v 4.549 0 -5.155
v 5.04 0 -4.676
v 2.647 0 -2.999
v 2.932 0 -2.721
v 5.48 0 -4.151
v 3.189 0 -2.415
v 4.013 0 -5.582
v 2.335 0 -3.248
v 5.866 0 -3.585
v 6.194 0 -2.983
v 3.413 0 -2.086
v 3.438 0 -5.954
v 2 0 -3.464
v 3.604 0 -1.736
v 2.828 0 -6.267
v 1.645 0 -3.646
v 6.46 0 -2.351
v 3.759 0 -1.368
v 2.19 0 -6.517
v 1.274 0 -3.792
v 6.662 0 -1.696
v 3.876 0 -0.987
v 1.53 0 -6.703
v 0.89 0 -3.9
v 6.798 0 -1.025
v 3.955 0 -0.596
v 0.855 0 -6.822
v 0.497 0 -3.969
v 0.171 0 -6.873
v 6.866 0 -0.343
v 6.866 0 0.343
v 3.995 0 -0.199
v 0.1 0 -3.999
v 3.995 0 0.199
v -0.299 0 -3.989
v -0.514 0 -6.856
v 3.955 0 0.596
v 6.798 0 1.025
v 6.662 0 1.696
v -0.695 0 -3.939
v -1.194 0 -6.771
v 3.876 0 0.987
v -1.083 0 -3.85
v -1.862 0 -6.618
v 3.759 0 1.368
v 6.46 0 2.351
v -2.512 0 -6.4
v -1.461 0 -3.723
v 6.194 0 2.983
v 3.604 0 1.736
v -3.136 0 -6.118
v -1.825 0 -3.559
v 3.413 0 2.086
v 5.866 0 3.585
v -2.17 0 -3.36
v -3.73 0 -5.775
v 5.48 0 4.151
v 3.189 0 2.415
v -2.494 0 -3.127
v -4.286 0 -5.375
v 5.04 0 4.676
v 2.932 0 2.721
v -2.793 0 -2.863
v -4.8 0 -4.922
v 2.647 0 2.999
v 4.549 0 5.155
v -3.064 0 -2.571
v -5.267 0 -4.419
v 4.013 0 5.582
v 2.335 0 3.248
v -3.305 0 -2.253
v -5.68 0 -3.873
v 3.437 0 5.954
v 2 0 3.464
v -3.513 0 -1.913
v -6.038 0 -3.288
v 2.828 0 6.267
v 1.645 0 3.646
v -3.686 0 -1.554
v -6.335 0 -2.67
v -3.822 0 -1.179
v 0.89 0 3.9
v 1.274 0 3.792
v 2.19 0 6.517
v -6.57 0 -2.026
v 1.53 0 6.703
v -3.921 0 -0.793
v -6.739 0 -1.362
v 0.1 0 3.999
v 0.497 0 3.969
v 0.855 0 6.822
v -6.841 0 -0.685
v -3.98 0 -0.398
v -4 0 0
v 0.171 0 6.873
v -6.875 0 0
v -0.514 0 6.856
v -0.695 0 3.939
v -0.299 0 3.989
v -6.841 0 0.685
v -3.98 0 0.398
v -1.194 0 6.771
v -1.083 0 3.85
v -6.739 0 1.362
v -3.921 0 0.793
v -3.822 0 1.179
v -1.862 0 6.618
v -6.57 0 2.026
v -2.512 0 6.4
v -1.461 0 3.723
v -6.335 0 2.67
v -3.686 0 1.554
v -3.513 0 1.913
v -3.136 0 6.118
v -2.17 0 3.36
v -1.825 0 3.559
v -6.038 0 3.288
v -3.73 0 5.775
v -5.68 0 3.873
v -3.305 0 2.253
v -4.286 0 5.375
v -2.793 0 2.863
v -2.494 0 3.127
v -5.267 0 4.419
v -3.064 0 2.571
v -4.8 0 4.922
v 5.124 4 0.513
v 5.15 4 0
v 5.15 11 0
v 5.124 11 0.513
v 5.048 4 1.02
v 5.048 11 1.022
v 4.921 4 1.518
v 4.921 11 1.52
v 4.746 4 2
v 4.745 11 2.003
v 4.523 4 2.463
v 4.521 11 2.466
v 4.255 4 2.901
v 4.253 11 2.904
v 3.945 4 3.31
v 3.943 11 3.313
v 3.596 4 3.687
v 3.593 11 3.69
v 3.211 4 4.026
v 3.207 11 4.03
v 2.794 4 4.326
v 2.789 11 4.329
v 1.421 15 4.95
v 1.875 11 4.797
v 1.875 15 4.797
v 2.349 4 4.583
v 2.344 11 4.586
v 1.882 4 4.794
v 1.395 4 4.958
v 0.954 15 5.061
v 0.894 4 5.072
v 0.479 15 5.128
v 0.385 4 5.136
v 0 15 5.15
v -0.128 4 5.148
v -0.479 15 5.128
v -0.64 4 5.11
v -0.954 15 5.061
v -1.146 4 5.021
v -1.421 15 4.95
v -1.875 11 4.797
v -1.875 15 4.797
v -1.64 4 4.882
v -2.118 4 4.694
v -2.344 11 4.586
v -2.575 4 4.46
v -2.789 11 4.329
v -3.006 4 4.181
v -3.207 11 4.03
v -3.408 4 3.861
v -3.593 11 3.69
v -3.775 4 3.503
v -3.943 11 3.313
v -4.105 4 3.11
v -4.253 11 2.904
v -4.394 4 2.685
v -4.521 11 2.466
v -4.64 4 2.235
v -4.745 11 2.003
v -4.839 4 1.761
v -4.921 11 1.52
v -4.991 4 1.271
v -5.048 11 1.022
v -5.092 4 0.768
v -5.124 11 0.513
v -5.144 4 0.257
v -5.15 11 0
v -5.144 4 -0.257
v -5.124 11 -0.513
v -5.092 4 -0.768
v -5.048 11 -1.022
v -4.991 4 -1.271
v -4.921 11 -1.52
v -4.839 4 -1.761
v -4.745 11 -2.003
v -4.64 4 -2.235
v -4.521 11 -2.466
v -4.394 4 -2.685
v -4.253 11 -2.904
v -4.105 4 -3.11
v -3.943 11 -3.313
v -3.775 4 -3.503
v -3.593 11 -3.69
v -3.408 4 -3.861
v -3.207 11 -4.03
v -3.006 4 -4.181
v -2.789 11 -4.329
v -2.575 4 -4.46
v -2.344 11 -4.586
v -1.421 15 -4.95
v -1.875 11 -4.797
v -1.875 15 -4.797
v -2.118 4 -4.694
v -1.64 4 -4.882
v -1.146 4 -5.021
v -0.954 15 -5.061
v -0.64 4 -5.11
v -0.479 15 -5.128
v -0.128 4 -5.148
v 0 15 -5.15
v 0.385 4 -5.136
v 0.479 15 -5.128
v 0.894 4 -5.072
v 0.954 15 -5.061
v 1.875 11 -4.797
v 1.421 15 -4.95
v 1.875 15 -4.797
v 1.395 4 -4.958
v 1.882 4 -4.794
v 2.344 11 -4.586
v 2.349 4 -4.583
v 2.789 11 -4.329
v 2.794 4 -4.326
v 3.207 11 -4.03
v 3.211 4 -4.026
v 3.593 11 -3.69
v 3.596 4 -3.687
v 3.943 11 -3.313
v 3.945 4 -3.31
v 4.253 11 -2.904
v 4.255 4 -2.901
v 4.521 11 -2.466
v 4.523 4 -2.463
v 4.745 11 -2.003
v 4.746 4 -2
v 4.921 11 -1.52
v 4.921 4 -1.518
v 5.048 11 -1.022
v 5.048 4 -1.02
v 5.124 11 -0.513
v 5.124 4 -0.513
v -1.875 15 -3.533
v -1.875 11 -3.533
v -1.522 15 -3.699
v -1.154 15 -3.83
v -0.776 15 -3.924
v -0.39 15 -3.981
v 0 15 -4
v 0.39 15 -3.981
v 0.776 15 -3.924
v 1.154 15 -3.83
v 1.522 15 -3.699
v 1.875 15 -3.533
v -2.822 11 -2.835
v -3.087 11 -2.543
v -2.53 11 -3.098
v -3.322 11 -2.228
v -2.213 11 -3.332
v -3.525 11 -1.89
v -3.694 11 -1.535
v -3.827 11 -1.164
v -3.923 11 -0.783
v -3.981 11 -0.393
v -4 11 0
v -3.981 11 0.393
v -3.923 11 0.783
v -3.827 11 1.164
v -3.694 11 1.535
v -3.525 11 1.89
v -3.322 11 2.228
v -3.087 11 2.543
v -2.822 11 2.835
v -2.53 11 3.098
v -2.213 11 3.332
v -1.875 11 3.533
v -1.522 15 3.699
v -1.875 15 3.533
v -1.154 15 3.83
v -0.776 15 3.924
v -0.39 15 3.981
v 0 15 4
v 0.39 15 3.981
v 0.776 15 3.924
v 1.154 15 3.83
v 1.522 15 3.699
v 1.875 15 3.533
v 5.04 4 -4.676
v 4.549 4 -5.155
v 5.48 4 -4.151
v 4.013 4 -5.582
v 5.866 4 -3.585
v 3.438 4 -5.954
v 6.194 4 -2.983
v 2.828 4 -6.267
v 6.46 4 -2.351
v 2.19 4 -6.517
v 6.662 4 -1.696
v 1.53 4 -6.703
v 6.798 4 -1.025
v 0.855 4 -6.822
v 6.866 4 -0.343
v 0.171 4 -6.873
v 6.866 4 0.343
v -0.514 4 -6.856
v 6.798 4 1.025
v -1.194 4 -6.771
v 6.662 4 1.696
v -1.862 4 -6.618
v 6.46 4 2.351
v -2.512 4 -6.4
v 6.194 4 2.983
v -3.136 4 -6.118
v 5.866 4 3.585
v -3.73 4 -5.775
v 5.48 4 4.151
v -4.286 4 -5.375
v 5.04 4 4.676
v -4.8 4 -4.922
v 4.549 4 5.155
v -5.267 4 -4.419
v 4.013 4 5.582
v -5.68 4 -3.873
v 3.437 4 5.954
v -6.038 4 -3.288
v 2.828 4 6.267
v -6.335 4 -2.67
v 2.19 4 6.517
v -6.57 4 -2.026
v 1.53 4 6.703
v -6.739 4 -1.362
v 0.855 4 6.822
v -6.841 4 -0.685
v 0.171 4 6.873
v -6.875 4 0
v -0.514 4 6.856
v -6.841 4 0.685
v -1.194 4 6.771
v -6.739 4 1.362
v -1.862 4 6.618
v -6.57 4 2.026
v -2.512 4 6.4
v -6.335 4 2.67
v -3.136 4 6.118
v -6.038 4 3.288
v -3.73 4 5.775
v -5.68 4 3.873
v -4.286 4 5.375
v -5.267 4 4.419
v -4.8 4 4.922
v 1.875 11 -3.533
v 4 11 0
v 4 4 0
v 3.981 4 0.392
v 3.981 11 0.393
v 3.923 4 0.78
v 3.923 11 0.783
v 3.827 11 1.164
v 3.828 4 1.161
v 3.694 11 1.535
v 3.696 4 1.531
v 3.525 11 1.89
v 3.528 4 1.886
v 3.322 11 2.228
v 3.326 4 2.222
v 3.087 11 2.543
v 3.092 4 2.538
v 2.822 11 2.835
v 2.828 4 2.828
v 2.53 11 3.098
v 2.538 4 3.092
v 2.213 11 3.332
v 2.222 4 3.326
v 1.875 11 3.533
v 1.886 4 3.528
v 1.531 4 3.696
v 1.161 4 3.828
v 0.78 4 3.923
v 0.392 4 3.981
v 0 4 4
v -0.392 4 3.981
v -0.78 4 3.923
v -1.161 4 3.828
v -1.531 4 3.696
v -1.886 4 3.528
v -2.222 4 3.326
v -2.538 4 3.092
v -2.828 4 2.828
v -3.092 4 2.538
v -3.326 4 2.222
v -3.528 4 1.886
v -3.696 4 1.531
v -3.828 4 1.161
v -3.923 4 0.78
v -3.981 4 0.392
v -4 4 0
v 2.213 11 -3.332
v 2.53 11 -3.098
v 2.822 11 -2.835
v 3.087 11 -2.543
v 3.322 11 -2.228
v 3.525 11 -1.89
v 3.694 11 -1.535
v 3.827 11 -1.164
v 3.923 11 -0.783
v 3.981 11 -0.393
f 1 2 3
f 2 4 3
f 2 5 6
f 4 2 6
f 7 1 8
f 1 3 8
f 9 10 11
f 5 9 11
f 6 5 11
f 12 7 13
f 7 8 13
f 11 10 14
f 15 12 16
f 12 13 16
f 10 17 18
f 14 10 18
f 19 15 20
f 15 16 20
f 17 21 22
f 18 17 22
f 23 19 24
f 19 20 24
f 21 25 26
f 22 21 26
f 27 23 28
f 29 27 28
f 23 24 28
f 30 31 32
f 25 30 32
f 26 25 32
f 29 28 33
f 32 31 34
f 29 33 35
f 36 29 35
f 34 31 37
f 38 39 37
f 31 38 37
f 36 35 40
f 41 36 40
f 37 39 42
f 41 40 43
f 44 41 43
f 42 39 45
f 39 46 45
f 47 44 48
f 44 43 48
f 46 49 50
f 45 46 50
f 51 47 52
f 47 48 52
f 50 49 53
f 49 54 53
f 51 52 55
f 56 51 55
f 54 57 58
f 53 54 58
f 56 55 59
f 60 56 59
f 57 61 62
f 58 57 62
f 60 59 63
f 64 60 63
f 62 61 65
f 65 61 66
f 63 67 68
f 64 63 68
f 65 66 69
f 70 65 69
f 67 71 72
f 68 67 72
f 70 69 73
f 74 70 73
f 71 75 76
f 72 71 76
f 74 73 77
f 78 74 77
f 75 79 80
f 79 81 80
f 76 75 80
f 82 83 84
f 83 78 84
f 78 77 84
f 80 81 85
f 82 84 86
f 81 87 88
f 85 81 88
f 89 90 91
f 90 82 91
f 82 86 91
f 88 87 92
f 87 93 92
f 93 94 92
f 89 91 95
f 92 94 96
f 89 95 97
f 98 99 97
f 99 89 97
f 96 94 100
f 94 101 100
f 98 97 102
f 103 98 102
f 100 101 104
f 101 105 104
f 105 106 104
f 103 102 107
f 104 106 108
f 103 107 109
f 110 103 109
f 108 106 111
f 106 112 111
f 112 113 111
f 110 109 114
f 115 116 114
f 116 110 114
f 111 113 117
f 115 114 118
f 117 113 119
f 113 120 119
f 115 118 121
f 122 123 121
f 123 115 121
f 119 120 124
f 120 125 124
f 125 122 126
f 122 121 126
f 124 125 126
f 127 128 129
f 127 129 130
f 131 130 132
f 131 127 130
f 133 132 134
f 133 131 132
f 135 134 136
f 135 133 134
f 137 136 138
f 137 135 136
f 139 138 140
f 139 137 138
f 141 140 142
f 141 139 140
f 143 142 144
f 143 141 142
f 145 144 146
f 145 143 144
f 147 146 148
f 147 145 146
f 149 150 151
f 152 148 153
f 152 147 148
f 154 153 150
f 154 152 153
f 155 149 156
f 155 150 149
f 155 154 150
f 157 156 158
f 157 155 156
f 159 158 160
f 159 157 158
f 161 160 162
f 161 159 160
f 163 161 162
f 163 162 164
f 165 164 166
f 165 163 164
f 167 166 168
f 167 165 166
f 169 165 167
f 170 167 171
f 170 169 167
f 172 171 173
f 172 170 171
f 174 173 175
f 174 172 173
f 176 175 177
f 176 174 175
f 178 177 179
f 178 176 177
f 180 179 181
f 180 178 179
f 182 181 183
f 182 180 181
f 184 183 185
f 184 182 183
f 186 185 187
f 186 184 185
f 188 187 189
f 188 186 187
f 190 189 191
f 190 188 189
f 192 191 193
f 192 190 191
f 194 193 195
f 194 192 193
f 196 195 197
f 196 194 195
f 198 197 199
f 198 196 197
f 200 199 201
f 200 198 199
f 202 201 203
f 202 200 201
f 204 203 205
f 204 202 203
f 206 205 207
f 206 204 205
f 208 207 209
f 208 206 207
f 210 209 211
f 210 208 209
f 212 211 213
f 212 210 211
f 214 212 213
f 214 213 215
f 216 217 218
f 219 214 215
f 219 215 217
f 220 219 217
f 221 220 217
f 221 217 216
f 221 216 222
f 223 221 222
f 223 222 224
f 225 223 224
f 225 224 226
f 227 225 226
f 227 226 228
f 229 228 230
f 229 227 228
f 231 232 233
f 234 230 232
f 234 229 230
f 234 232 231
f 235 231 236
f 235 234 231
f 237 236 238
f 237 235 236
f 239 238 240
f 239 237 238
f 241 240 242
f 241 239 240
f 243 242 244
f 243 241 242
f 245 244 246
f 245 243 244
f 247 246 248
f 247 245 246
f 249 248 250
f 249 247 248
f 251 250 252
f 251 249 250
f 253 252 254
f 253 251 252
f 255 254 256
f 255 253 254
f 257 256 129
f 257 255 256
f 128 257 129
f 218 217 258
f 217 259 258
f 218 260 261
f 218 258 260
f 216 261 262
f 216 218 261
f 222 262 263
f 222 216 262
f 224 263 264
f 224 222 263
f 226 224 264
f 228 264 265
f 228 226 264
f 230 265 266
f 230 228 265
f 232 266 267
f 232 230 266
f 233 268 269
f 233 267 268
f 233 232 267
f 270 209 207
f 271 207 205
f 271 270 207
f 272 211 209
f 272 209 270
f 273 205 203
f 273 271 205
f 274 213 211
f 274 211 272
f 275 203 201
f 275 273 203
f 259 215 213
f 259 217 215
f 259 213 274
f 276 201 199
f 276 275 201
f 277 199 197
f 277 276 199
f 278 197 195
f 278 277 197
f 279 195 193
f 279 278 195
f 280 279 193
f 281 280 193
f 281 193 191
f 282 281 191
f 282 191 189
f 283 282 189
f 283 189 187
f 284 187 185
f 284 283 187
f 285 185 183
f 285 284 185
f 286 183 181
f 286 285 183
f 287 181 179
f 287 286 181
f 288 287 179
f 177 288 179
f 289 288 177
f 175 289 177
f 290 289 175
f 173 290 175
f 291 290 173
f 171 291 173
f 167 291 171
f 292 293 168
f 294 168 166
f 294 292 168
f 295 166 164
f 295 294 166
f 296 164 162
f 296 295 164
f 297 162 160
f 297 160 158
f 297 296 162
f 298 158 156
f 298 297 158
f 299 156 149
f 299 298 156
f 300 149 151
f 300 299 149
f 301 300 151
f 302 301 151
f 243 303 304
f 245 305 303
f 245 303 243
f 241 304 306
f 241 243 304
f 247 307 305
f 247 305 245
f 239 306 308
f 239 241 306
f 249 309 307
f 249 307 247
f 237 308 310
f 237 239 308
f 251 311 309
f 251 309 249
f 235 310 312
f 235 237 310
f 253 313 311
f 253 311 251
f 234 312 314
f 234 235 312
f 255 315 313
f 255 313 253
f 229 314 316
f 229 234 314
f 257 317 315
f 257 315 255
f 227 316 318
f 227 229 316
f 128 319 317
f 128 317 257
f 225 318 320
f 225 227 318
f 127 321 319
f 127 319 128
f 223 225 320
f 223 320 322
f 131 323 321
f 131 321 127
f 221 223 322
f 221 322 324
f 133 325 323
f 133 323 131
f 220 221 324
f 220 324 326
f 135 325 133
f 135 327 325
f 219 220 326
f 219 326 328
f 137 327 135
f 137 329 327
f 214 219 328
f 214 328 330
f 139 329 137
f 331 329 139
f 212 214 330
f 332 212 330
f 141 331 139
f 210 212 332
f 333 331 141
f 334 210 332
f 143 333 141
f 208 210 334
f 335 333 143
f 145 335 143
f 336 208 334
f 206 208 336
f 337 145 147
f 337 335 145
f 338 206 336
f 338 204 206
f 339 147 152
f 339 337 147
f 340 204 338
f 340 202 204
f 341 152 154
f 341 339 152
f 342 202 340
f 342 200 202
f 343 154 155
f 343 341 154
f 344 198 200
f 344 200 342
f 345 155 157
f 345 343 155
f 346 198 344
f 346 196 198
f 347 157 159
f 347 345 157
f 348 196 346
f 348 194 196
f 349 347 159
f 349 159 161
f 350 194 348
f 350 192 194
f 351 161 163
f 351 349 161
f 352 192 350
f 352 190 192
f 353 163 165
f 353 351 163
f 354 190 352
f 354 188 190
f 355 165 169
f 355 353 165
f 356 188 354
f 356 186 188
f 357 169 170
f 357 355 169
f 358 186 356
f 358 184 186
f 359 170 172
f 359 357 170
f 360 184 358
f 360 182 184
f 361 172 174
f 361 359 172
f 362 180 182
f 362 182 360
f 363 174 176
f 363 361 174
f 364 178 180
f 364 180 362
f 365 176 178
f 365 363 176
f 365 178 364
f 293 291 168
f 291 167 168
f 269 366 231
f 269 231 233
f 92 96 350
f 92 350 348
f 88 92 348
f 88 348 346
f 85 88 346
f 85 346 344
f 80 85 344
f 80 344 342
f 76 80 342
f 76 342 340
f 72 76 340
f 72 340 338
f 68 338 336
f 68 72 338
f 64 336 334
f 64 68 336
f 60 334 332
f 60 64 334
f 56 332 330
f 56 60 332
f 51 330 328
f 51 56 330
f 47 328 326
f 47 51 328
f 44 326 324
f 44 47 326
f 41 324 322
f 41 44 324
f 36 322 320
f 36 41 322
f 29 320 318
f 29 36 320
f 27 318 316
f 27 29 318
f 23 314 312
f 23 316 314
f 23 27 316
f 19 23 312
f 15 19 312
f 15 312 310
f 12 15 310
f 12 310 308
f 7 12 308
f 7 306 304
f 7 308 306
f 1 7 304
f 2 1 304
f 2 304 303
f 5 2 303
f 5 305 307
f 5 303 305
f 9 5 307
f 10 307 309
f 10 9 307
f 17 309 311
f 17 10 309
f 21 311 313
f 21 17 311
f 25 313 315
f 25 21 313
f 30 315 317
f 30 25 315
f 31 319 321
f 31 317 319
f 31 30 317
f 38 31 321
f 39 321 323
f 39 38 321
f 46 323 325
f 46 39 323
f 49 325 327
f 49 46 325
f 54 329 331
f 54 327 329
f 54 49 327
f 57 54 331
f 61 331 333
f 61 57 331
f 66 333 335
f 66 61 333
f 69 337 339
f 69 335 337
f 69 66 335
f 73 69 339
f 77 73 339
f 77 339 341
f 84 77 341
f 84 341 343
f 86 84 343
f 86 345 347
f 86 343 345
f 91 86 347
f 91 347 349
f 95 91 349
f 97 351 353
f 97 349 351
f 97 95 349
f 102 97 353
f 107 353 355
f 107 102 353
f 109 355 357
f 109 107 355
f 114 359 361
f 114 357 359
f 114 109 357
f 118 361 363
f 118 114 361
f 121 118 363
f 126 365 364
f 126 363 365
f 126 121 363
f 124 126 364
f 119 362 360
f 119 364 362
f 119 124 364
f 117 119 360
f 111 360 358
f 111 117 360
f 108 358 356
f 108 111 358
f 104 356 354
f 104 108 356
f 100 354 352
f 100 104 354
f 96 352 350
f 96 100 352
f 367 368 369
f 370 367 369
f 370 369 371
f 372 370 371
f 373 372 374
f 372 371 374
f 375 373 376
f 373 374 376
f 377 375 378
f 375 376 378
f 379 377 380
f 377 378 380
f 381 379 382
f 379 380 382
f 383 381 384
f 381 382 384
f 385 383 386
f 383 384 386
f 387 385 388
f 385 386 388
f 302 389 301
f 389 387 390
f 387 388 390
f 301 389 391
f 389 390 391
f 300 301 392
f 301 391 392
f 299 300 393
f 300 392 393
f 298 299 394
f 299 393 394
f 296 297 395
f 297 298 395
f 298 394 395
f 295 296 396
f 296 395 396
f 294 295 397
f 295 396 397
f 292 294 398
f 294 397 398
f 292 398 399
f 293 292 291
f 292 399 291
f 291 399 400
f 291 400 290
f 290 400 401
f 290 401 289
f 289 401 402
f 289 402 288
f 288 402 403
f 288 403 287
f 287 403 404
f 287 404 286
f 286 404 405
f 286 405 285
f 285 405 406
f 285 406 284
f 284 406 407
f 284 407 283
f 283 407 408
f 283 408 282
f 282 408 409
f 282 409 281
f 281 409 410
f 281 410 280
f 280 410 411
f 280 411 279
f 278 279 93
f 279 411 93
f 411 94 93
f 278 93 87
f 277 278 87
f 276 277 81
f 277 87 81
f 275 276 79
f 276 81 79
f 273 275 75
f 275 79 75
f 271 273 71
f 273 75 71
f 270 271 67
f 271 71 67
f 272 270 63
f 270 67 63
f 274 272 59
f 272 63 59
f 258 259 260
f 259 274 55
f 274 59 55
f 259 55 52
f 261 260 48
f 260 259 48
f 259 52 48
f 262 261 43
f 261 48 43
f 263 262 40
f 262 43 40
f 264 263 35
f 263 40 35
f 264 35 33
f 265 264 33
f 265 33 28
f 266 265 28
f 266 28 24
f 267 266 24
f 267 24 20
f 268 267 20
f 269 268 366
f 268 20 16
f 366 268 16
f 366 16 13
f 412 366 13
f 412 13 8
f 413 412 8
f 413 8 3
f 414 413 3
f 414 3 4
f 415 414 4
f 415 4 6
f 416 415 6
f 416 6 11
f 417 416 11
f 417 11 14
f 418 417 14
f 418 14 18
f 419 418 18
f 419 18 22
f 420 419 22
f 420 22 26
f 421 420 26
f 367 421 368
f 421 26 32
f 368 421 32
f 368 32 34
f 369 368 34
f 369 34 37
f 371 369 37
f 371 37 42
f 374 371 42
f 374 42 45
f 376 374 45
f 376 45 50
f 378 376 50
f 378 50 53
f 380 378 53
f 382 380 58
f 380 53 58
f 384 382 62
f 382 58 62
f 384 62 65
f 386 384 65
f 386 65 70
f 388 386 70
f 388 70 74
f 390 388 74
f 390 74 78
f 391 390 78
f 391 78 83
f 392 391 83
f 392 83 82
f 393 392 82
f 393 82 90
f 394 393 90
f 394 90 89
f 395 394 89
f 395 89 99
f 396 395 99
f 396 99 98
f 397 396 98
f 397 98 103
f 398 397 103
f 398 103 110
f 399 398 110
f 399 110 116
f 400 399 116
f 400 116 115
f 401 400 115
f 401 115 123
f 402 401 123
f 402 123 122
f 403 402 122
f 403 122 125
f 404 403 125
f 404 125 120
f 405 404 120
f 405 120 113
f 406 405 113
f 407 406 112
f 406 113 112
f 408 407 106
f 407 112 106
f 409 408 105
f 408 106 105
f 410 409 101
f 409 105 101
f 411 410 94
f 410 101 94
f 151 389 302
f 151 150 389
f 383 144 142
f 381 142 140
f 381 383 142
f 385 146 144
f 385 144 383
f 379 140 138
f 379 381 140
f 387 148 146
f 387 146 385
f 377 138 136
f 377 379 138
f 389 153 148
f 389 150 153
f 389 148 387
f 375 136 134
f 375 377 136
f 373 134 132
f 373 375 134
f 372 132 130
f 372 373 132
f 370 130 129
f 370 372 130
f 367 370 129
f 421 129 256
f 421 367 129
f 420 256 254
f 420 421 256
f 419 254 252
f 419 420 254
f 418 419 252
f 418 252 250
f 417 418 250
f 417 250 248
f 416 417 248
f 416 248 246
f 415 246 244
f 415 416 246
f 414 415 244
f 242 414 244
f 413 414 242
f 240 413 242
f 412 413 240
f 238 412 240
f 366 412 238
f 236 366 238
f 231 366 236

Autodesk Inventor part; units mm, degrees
ref_plane "XZ Plane" through (0, 0, 0) normal (0, 1, 0) x (-1, 0, 0)
sketch "Szkic1" plane through (0, 0, 0) normal (0, 1, 0) x (-1, 0, 0)
  circle A0 centre (0, 0) radius 6.875
  circle A1 centre (0, 0) radius 4
  dimension "d0" = 13.75
  dimension "d1" = 8
extrude "Wyciągnięcie proste1" add sketch "Szkic1" along normal blind 4
sketch "Szkic2" plane through (0, 4, 0) normal (0, 1, 0) x (1, 0, 0)
  circle A0 centre (0, 0) radius 5.15
  circle A1 centre (0, 0) radius 4 projected
  dimension "d4" = 10.3
extrude "Wyciągnięcie proste2" add sketch "Szkic2" along normal blind 11
ref_plane "Płaszczyzna konstrukcyjna1" through (1.875, 0, 0) normal (1, 0, 0) x (0, 1, 0)
sketch "Szkic3" plane through (1.875, 0, 0) normal (1, 0, 0) x (0, 1, 0)
  line L0 (15, 4) -> (15, -4) projected
  line L1 (0, -4) -> (0, 4) projected
  line L2 (4, 5.15) -> (15, 5.15) projected
  line L3 (4, -5.15) -> (15, -5.15) projected
  line L4 (15, -5.15) -> (15, 5.15) projected
  line L5 (15, 5.15) -> (11, 5.15)
  line L6 (11, 5.15) -> (11, -5.15)
  line L7 (11, -5.15) -> (15, -5.15)
  line L8 (15, -5.15) -> (15, 5.15)
  point P0 (0, 0)
  dimension "d8" = 4
extrude "Wyciągnięcie proste3" cut sketch "Szkic3" along normal through all
ref_plane "Płaszczyzna konstrukcyjna2" through (-1.875, 0, 0) normal (1, 0, 0) x (0, 1, 0)
sketch "Szkic4" plane through (-1.875, 0, 0) normal (1, 0, 0) x (0, 1, 0)
  line L0 (4, 5.15) -> (4, -5.15) projected
  line L1 (15, -4.7965) -> (11, -4.7965) projected
  line L2 (11, -4.7965) -> (11, 4.7965) projected
  line L3 (11, 4.7965) -> (15, 4.7965) projected
  line L4 (15, -4.7965) -> (15, 4.7965) projected
  line L5 (4, 5.15) -> (15, 5.15) projected
  line L6 (15, -6.2367) -> (11, -6.2367)
  line L7 (11, -6.2367) -> (11, 6.0914)
  line L8 (11, 6.0914) -> (15, 6.0914)
  line L9 (15, 6.0914) -> (15, -6.2367)
  point P0 (0, 0)
extrude "Wyciągnięcie proste4" cut sketch "Szkic4" against normal through all
properties part number "napinacz nakretki tr8"
